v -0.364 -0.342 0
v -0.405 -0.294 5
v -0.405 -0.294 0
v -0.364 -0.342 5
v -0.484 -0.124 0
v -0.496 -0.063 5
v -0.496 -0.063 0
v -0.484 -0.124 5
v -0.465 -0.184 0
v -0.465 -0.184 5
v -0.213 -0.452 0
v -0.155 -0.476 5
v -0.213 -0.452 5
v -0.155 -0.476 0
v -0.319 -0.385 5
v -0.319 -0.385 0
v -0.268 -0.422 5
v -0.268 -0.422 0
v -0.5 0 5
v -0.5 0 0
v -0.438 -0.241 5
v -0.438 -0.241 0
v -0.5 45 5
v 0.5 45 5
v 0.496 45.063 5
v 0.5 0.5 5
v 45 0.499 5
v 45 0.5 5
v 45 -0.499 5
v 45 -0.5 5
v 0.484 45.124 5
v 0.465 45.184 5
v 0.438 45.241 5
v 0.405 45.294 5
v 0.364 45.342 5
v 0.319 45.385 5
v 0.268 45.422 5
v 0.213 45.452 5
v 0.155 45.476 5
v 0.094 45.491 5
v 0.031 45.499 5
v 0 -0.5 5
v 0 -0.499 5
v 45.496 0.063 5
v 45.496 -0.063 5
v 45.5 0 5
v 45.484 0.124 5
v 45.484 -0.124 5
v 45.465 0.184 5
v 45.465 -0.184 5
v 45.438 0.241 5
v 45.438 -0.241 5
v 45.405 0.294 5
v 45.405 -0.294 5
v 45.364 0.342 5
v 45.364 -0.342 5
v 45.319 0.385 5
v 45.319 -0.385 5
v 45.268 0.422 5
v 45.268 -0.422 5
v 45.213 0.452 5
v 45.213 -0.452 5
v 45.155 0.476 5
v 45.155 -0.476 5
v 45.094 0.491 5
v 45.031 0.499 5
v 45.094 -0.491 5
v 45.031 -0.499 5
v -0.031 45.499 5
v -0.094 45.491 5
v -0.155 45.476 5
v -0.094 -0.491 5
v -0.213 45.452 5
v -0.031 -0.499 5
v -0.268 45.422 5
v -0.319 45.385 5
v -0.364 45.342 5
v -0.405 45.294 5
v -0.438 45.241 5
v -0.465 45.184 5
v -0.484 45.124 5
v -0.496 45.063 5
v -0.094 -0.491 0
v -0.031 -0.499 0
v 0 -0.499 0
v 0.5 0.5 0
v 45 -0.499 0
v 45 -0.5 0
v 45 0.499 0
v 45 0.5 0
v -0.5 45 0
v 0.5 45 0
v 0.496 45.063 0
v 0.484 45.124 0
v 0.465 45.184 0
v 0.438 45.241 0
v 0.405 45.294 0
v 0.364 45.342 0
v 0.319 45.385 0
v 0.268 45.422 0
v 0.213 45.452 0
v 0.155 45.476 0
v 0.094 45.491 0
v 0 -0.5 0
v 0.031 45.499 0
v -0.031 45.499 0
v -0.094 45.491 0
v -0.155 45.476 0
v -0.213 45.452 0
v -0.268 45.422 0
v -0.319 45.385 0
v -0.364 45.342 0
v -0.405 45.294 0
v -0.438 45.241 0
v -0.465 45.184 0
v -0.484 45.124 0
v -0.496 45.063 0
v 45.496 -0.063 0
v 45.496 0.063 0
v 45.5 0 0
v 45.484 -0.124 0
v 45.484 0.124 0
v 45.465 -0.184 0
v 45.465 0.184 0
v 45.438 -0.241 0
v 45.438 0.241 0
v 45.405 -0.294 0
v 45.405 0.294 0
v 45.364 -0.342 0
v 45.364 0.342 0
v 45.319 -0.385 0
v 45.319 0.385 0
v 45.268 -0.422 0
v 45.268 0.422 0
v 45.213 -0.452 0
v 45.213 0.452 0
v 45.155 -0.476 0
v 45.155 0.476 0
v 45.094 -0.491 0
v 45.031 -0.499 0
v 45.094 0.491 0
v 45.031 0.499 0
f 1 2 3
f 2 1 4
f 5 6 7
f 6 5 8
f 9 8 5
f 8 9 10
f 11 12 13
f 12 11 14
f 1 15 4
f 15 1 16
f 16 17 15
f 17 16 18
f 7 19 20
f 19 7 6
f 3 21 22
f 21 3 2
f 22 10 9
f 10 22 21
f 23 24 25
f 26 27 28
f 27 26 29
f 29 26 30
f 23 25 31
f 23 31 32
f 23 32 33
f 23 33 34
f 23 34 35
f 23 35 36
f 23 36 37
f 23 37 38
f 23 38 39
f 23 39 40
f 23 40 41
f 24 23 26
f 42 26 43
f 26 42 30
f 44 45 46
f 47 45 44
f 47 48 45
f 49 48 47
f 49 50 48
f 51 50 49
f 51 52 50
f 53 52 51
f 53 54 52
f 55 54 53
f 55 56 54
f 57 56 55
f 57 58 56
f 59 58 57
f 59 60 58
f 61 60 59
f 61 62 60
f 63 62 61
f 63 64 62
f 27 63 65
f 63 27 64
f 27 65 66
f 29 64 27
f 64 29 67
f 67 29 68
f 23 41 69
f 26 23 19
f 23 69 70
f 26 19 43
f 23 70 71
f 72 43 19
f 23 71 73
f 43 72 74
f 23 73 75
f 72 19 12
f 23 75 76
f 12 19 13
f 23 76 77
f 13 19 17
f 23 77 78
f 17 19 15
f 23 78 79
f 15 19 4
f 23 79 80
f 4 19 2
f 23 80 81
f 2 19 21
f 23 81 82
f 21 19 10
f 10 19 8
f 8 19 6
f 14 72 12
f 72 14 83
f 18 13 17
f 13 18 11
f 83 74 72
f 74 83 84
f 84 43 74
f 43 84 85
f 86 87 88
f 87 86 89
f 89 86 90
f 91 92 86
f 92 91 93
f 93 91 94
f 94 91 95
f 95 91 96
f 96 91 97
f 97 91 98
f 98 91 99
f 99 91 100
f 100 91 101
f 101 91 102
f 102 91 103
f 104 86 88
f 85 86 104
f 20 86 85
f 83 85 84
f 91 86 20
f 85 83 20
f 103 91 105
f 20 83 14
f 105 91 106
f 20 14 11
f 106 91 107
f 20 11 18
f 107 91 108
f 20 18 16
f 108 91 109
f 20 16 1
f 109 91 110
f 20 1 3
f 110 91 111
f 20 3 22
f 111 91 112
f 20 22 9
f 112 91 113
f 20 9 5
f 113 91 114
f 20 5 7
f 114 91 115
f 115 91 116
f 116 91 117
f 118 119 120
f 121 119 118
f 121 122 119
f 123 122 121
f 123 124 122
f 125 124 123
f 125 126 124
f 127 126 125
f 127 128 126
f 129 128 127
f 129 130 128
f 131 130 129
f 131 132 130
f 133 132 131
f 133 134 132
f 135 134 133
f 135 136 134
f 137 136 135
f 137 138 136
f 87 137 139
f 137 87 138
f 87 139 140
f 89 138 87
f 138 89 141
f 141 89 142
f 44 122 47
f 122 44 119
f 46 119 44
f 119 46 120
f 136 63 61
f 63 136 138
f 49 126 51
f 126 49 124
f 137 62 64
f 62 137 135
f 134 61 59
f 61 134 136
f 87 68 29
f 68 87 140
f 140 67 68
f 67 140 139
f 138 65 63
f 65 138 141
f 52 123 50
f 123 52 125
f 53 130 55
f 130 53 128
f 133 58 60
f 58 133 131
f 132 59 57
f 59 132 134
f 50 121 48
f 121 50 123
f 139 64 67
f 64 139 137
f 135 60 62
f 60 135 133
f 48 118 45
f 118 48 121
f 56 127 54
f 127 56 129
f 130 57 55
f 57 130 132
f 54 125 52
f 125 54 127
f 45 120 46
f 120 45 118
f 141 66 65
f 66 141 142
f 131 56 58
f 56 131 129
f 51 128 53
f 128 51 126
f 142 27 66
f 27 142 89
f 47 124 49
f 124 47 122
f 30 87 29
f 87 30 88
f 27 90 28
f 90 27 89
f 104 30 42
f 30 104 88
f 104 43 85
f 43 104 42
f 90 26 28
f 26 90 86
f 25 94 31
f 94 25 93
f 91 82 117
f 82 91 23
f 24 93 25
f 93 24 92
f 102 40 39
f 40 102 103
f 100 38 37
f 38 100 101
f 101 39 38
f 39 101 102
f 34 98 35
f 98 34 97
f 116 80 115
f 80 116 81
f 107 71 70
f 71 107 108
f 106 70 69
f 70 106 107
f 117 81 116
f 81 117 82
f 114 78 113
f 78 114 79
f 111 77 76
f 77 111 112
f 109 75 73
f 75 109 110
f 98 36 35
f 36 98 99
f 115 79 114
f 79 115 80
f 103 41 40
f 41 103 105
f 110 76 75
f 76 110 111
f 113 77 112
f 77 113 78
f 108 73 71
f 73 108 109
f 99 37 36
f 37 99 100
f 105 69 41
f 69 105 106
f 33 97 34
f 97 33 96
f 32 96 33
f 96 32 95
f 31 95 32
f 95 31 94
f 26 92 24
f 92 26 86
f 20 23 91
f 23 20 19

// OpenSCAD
//aldous-broder 


no_wall=0;
right_wall=1;
up_wall=2;
up_right_wall=3;


/*
east=0;
north=1;
west=2;
south=3;
*/
function rnd(start_num,end_num)=round(rands(start_num,end_num,1)[0]);




function starting_point(columns,rows)=
[rnd(0,columns-1),rnd(0,rows-1)];

function get_x(list)=list[0];
function get_y(list)=list[1];
function get_wall_type(list)=list[2];
function get_type(list)=list[3];


function block_data(x,y,walltype)=[x,y,walltype];


function indexOf(x,y,maze,i=0)=
    i>len(maze)?-1:(
    [get_x(maze[i]),get_y(maze[i])]==[x,y]?i:
    indexOf(x,y,maze,i+1)
    );

function starting_maze(columns,rows)=[
      for(i=[0:columns-1])
          for(j=[0:rows-1])
      [j,i,up_right_wall,false]
];


function visited(x,y,maze)=maze[indexOf(x,y,maze)][3];

    
function set_visited(x,y,maze)=[
          for(b=maze)
              [x,y]==[get_x(b),get_y(b)]?
                   [x,y,get_wall_type(b),true]:b
          ];

function visitable(x,y,maze,columns,rows)=
     y>=0 && y<rows &&
     x>=0 && x<columns;


function sum(list)=
      let(leng=len(list))
      leng==1?list[0]:
      leng==2?list[0]+list[1]:
      let( 
          sum_first=list[0]+list[1],
          sum_after=[for(i=[2:leng-1])
              list[i]])    
      sum(concat(sum_first,sum_after));
          
function rand_dirs()=
     [
       [0,1,2,3],
       [0,1,3,2],
       [0,2,1,3],
       [0,2,3,1],
       [0,3,1,2],
       [0,3,2,1],
       [1,0,2,3],
       [1,0,3,2],
       [1,2,0,3],
       [1,2,3,0],
       [1,3,0,2],
       [1,3,2,0],
       [2,0,1,3],
       [2,0,3,1],
       [2,1,0,3],
       [2,1,3,0],
       [2,3,0,1],
       [2,3,1,0],
       [3,0,1,2],
       [3,0,2,1],
       [3,1,0,2],
       [3,1,2,0],
       [3,2,0,1],
       [3,2,1,0]       
          ][rnd(0,23)];          


function all_visited(maze)=[
         for(i=[0:len(maze)-1])
         get_type(maze[i])==true? 0:1
         ];

function next_x(x,dir)=x+[1,0,-1,0][dir];
function next_y(y,dir)=y+[0,1,0,-1][dir];

        
function go_maze(x,y,maze,columns,rows)=
       let(dirs=rand_dirs())
        sum(all_visited(maze))==0?
         set_visited(x,y,maze):   
         walk_around_from(
         x,y,
         dirs,
         set_visited(x,y,maze),
         columns,rows,4
         );
                
function walk_around_from(x,y,dirs,maze,columns,rows,i)=
        i>0?
        walk_around_from(
                x,y,
                dirs[4-i],
                try_routes_from(x,y,dirs[4-i],rows,columns),
                rows,columns,i-1)
        :maze;
function try_routes_from(x,y,dir,maze,rows,columns)=     visitable(next_x(x, dir), 
                  next_y(y, dir),
                  maze,
                  columns,
                  rows) ? 
         get_type(maze[indexOf(next_x(x,dir),
                              next_y(y,dir),
                              maze)])==false? 
                 go_maze(
            next_x(x,dir),
            next_y(y,dir), 
            try_block(dir,x,y,maze,columns,rows),
            columns, rows
        ):
                go_maze(
            next_x(x,dir),
            next_y(y,dir),
            maze,
            columns,rows
        ):maze;
             
         
         
         
         
         
//------------------------------------------------------------



module line(
    v1,
    v2,
    thickness,
    height=5
) {
    vectors = concat([v1],[v2]);
   
    for(vector=vectors)
    translate(vector)
    linear_extrude(height)
    circle(r=thickness/2,$fn=50);
     
    
    angle = atan((v2[1]-v1[1])/(v2[0]-v1[0]));
    offset = [[(thickness/2)*cos(90-angle), -((thickness/2)*sin(90-angle))],
              [-((thickness/2)*cos(90-angle)), (thickness/2)*sin(90-angle)]];
    points = [for (i=[0:1])
                for (j=[0:1])
                    i==0 ?
                    vectors[i]+offset[j] : vectors[i]-offset[j]];
    linear_extrude(height)
    polygon(points);
}


//-------------------------------------
module liner(points,thickness){
     idx=0;        
     module liner_inner(points,idx){
         if (idx<(len(points)-1)){
              line(points[idx],points[idx+1],thickness);
            
           liner_inner(points,idx+1);}
 }
     liner_inner(points,idx);
}

//------------------------------------


module draw_block(walltype,block_width,wall_thickness){
        if(walltype==2 ){
            liner([[0,block_width],[block_width,block_width]],wall_thickness);
            }
        if(walltype==1){
            liner([[block_width,0],[block_width,block_width]],wall_thickness);
            }
        if (walltype==3){
            liner([[0,block_width],[block_width,block_width]],wall_thickness);
            liner([[block_width,0],[block_width,block_width]],wall_thickness);
            }
    }
        

module draw_maze(columns,rows,blocks,bolck_width,wall_thickness){
    for(block=blocks){
        translate([get_x(block),get_y(block)]*block_width)
        draw_block(
              get_wall_type(block),
              block_width,
              wall_thickness
        );
        }
       
//the lowermost wall
        
    liner(
        [[0,0],[block_width*columns,0]],wall_thickness);
    
//the leftmost wall
    liner(
         [[0,0],[0,block_width*rows]],wall_thickness );
       

    }
    
    
    
function go_right_from(x,y,maze)=[
    for(b=maze)[get_x(b),get_y(b)]==[x,y]?(
         get_wall_type(b)==up_right_wall?
         [x,y,up_wall,visited(x,y,maze)]:
         [x,y,no_wall,visited(x,y,maze)])
        :b];


function go_up_from(x,y,maze)=[
    for(b=maze)[get_x(b),get_y(b)]==[x,y]?(
       get_wall_type(b)==up_right_wall?
       [x,y,right_wall,visited(x,y,maze)]:
       [x,y,no_wall,visited(x,y,maze)])
       :b];    
    
function go_left_from(x,y,maze)=[
    for(b=maze)[get_x(b),get_y(b)]==[x-1,y]?(
       get_wall_type(b)==up_right_wall?
       [x-1,y,up_wall,visited(x,y,maze)]:
       [x-1,y,no_wall,visited(x,y,maze)])
       :b];    
    
function go_down_from(x,y,maze)=[
    for(b=maze)[get_x(b),get_y(b)]==[x,y-1]?(
       get_wall_type(b)==up_right_wall?
       [x,y-1,right_wall,visited(x,y-1,maze)]:
       [x,y-1,no_wall,visited(x,y-1,maze)]) 
       :b];
    
function try_block(dir,x,y,maze,columns,rows)=
    dir==0?go_right_from(x,y,maze):(
         dir==1?go_up_from(x,y,maze):(
              dir==2?go_left_from(x,y,maze):
                   go_down_from(x,y,maze)    
        ));
    
   
    
    
    
    
    
//echo(go_maze(get_x(sp),get_y(sp),starting_maze(5,5),5,5));


block_width = 3;
wall_thickness = 1;
maze_rows = 15;
maze_columns = 15;  
sp=starting_point(maze_columns,maze_rows);

maze_blocks=go_maze(
     get_x(sp),
     get_y(sp),
     starting_maze(15,15),
     15,15
);
draw_maze(maze_columns,maze_rows,maze_blocks,block_width,wall_thickness);
